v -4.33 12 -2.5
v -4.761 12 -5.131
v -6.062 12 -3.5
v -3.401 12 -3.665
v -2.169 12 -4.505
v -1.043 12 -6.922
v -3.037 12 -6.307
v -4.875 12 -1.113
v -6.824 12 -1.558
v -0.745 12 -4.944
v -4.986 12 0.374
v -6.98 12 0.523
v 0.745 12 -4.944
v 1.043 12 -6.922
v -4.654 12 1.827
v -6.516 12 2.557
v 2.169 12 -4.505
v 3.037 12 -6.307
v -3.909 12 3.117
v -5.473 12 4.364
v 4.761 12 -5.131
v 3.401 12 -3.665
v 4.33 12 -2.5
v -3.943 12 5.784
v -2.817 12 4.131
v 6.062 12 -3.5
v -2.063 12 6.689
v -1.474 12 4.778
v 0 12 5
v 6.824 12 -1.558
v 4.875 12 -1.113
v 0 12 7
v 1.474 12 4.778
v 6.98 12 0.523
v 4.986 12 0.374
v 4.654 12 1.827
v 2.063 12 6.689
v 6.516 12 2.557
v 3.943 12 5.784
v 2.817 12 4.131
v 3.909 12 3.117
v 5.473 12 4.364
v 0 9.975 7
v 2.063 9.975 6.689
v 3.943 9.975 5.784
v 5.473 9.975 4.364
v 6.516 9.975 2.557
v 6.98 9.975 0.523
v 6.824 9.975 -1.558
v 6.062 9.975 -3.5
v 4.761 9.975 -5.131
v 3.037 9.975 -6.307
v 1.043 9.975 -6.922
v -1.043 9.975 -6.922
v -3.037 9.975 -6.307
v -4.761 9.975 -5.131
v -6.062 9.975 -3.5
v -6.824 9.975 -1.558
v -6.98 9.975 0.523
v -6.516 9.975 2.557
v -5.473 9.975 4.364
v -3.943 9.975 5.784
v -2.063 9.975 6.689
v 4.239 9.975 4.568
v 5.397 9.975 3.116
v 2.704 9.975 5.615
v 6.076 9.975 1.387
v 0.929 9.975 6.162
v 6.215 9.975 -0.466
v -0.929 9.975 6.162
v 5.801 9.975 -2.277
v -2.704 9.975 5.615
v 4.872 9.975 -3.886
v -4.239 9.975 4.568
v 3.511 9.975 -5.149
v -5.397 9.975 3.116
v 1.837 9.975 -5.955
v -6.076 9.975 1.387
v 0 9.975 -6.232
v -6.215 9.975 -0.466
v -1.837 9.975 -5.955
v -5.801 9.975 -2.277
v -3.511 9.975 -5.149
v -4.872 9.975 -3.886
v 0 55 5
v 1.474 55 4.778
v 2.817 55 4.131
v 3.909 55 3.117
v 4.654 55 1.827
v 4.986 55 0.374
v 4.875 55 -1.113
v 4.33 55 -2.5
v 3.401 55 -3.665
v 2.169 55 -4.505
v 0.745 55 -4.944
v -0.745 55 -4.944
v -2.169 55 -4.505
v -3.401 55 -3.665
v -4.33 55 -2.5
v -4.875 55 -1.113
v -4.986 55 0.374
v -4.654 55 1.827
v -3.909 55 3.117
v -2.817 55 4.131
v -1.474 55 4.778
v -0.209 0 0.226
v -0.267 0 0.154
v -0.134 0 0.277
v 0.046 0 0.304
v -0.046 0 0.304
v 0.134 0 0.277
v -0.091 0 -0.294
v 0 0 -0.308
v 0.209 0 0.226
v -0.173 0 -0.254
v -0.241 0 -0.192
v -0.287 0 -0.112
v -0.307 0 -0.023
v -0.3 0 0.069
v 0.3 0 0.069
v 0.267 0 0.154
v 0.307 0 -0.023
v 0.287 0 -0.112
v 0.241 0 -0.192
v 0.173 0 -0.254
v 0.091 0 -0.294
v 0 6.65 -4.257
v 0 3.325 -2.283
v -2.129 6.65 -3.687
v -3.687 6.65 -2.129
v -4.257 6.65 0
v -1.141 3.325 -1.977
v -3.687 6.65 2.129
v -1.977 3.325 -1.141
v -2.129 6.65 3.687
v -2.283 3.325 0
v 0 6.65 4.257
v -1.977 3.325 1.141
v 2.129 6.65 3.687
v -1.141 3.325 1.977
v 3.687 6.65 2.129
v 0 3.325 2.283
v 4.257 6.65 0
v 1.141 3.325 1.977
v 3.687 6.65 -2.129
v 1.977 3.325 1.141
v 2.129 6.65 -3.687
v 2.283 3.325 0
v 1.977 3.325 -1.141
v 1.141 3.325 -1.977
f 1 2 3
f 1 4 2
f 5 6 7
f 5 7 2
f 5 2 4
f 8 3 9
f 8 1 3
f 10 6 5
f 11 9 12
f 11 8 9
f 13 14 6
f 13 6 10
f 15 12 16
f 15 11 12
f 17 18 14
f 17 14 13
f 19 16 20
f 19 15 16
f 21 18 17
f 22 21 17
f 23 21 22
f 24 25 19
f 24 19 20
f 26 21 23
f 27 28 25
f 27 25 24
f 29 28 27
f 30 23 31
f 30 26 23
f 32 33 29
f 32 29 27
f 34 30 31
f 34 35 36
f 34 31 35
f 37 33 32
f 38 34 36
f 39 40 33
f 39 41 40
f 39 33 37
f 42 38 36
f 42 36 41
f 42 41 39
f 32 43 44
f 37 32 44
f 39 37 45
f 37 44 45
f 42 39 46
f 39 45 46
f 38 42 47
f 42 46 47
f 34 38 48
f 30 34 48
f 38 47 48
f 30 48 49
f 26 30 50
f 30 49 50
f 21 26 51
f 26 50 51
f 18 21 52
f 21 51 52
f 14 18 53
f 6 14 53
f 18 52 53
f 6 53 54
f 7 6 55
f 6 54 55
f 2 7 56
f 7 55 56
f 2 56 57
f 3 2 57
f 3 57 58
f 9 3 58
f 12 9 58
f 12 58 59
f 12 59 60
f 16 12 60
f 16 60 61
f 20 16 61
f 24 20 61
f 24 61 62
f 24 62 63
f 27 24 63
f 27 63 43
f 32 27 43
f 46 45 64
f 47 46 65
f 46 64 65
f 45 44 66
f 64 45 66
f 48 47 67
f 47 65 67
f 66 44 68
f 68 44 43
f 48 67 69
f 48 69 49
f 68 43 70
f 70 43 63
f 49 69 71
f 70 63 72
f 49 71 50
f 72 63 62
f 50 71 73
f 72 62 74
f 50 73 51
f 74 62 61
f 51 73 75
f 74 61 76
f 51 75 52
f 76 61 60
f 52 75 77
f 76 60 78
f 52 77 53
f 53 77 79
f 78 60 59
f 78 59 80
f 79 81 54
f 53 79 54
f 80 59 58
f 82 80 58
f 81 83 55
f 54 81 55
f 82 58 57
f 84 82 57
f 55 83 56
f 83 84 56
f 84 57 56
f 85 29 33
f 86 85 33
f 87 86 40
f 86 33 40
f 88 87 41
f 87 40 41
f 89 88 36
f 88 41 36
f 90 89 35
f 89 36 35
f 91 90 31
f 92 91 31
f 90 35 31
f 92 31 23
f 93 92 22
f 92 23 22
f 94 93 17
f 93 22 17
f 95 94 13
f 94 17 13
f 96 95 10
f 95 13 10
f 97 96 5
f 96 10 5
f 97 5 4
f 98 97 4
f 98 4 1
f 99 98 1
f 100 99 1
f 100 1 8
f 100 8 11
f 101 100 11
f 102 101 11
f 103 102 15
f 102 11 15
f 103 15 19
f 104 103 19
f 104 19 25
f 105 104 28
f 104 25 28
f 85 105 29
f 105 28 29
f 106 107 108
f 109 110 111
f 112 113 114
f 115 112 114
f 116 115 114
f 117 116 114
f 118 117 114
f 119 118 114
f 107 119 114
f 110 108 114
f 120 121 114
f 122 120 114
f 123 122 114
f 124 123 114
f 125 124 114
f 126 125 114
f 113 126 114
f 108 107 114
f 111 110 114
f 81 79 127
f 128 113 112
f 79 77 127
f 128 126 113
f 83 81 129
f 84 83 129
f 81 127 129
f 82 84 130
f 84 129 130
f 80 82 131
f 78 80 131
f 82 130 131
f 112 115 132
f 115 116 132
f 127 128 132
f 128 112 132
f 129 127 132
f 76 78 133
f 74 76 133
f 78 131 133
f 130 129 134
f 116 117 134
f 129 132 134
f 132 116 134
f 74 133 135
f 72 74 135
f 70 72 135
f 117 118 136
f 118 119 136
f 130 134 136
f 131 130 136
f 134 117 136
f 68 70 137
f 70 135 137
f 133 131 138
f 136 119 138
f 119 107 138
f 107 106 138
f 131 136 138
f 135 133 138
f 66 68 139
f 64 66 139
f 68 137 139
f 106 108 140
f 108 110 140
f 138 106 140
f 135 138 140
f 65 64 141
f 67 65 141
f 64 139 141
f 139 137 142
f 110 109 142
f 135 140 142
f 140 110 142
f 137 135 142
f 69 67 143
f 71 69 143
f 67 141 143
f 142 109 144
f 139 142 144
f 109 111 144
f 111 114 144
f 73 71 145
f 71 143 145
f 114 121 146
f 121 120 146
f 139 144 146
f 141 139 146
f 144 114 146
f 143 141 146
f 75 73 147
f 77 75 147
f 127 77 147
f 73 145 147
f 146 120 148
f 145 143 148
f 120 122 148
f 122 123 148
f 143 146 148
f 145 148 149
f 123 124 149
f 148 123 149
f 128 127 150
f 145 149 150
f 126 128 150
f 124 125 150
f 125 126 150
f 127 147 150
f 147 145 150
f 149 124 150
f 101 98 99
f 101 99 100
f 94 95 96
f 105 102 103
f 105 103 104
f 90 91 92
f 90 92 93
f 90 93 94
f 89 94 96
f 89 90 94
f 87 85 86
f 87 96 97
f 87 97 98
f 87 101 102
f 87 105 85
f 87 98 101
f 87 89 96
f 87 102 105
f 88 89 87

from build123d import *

# Parameters (mm, degrees)
SKETCH_1_R          = 7
EXTRUDE_1_DEPTH     = 55
CUT_EXTRUDE_START   = -43
SKETCH_2_R          = 7
SKETCH_2_R_2        = 5
CUT_EXTRUDE_2_DEPTH = 43


with BuildPart() as part:
    # 草图1 → 凸台-拉伸1 (new body)
    with BuildSketch(Plane(origin=(0, 0, 0), x_dir=(1, 0, 0), z_dir=(0, 1, 0))):
        with Locations(Location((0, 0, 0), (0, 0, 270))):
            Circle(SKETCH_1_R)
    extrude(amount=EXTRUDE_1_DEPTH)

    # 草图2 → 切除-拉伸2 (cut)
    with BuildSketch(Plane(origin=(0, 55, 0), x_dir=(1, 0, 0), z_dir=(0, 1, 0)).offset(CUT_EXTRUDE_START)):
        with Locations(Location((0, 0, 0), (0, 0, 270))):
            Circle(SKETCH_2_R)
        with Locations(Location((0, 0, 0), (0, 0, 270))):
            Circle(SKETCH_2_R_2, mode=Mode.SUBTRACT)
    extrude(amount=CUT_EXTRUDE_2_DEPTH, mode=Mode.SUBTRACT)

    # 草图8 → 切除-旋转25 (revolve, cut)
    with BuildSketch(Plane.XY, mode=Mode.PRIVATE) as cut_revolve_25_sk:
        Polygon((-7, 9.974534831), (-6.231936672, 9.974534831), (-0.307906931, 0), (-7, 0), align=None)
    revolve(cut_revolve_25_sk.sketch.rotate(Axis((0, 0, 0), (0, 1, 0)), 270), axis=Axis((0, 0, 0), (0, 1, 0)), mode=Mode.SUBTRACT)


solid = part.part
